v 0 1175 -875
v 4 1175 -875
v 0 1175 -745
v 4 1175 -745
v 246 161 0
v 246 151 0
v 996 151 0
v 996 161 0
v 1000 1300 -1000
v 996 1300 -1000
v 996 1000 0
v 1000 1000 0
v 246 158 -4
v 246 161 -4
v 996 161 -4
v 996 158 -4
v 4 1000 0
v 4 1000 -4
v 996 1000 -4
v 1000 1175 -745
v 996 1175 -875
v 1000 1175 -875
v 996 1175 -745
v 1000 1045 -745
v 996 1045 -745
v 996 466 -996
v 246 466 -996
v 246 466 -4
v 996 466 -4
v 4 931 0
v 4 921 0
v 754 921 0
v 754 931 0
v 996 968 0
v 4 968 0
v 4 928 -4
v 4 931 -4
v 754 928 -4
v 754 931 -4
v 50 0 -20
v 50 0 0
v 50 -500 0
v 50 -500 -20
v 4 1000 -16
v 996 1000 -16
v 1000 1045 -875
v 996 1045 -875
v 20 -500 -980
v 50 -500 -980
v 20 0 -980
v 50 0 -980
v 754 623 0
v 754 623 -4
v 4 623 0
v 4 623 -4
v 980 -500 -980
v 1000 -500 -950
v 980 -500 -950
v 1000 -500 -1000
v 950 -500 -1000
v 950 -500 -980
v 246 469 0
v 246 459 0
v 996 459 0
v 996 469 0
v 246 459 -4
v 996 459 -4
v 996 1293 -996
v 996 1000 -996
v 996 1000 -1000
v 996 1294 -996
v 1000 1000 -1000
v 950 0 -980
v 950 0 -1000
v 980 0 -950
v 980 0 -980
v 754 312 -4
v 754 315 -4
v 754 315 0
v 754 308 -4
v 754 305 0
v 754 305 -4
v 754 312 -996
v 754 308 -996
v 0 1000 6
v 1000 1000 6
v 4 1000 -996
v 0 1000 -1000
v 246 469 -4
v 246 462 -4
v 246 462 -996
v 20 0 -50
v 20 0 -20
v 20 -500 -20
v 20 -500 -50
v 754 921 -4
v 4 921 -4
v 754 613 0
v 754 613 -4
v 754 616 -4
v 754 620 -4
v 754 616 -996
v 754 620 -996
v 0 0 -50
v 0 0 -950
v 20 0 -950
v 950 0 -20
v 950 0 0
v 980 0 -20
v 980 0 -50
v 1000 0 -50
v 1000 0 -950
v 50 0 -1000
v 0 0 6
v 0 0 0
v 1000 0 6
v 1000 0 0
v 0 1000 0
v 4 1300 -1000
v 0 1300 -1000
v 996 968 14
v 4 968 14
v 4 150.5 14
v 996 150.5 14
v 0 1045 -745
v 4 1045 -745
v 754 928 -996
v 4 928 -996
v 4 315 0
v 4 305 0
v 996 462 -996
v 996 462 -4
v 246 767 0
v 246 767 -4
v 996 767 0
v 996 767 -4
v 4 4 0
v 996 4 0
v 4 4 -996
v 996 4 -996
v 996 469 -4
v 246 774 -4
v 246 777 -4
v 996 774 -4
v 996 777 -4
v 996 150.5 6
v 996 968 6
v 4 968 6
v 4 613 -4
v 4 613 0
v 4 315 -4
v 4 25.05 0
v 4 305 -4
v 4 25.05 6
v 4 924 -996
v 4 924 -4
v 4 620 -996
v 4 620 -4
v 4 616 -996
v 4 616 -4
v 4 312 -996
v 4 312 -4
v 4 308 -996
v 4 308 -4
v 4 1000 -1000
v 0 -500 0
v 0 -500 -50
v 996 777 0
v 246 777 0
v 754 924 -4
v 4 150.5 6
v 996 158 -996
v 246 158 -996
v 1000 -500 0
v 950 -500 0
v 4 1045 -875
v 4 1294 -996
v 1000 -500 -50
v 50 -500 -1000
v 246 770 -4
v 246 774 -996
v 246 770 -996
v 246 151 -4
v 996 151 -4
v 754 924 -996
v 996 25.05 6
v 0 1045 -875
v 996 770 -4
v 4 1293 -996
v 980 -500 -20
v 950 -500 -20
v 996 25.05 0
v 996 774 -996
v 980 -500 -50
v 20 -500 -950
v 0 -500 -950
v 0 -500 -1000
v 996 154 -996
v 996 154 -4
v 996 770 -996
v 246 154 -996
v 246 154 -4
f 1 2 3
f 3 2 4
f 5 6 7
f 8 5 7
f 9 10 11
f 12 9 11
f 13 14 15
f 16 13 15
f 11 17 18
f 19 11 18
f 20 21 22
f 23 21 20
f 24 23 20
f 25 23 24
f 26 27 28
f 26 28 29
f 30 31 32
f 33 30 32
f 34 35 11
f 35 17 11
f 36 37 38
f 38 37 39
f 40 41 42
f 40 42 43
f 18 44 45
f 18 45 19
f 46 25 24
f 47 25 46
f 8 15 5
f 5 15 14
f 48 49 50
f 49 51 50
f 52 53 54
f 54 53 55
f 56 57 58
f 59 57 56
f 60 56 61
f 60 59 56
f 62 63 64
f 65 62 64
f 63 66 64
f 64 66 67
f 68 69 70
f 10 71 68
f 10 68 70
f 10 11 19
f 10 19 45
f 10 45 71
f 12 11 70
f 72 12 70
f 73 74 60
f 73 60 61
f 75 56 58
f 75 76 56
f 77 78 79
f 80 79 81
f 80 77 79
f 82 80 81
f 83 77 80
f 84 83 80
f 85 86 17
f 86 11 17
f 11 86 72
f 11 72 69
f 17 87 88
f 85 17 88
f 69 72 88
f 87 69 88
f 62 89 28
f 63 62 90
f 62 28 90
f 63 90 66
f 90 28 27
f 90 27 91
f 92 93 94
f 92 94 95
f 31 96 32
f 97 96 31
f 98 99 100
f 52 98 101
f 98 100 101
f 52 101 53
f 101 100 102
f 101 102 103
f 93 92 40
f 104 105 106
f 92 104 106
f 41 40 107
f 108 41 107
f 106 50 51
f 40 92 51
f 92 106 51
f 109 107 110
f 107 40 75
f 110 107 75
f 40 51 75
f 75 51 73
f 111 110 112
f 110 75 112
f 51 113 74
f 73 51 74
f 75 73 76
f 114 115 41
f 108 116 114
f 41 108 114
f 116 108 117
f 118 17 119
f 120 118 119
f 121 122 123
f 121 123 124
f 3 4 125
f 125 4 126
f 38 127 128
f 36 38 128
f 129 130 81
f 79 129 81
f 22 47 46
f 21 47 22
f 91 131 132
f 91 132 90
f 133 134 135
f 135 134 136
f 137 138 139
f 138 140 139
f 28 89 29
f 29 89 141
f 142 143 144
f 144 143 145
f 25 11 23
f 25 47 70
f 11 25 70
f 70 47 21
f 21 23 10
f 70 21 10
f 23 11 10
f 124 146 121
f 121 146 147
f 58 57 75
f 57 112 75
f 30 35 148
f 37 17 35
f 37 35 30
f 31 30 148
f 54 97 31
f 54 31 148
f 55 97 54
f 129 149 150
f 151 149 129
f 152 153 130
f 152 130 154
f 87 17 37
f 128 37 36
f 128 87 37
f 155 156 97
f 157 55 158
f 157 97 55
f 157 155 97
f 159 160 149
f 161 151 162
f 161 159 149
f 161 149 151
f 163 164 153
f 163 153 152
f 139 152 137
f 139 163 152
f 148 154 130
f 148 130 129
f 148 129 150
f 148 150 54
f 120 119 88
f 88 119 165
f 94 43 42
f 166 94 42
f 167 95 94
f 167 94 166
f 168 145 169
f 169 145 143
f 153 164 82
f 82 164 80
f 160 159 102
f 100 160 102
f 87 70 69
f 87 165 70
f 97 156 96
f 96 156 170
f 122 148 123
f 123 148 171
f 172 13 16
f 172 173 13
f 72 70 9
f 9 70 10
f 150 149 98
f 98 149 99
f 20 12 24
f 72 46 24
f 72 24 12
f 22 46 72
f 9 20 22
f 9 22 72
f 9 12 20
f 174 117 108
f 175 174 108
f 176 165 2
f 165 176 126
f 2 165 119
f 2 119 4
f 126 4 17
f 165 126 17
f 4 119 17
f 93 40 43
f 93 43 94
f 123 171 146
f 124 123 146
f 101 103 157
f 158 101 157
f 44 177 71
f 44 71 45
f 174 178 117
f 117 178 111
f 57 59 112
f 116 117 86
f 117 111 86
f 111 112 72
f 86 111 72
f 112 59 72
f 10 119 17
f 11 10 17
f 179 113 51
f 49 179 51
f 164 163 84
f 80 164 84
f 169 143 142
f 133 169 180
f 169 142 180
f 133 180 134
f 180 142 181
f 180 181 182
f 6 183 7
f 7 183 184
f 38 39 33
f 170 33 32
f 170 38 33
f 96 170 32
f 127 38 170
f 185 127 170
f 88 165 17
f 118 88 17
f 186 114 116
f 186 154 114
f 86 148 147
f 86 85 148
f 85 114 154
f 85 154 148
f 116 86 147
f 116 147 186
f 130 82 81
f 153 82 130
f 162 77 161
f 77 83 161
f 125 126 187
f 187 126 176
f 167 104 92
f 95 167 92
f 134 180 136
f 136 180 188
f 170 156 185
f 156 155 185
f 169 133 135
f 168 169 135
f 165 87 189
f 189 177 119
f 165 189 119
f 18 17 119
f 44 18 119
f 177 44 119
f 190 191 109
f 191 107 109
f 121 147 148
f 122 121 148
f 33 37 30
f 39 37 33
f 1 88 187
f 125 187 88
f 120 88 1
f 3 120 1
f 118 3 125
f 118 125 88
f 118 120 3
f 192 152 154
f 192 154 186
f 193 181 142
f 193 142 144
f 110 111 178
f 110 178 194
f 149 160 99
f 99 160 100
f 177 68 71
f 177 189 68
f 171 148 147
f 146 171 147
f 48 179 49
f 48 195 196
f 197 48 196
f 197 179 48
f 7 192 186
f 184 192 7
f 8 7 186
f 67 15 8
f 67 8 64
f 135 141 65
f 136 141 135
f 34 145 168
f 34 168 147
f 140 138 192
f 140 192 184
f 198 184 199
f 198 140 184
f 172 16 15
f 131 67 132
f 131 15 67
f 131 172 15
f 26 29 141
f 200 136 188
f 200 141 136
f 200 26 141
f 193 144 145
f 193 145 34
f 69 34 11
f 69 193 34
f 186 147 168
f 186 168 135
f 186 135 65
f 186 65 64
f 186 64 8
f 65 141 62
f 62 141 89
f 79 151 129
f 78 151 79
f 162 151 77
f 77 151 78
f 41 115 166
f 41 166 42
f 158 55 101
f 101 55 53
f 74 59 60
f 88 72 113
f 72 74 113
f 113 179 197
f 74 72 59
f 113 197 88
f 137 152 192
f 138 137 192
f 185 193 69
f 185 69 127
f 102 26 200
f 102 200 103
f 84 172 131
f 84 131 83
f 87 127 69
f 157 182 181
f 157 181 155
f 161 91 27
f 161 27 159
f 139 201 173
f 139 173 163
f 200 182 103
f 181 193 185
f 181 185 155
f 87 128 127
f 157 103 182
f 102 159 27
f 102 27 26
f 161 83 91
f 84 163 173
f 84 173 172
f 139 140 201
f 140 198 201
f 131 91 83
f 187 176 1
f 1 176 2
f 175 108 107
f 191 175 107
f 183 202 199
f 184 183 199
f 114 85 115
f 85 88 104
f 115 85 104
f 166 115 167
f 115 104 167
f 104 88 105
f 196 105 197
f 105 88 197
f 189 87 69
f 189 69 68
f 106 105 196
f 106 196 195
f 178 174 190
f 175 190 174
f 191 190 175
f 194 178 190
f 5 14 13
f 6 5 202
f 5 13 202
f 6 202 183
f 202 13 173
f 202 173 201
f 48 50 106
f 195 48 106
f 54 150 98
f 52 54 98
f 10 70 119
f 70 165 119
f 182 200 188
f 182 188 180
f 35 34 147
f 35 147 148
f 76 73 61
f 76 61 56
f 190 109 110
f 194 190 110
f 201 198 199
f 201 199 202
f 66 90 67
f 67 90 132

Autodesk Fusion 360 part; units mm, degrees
sketch "Sketch1" plane through (0, 0, 0) normal (0, 1, 0) x (1, 0, 0)
  line L0 (1000, 0) -> (1000, 1000)
  line L1 (1000, 1000) -> (0, 1000)
  line L2 (0, 1000) -> (0, 0)
  line L3 (996, 4) -> (996, 996)
  line L4 (996, 996) -> (4, 996)
  line L5 (4, 996) -> (4, 4)
  line L6 (996, 4) -> (996, 0)
  line L7 (996, 0) -> (1000, 0)
  line L8 (4, 4) -> (4, 0)
  line L9 (4, 0) -> (0, 0)
  dimension "d1" = 1000
  dimension "d2" = 1000
  dimension "d3" = 992
  dimension "d4" = 992
extrude "Extrude1" add sketch "Sketch1" along normal blind 1000 makes body 1
ref_plane "WorkPlane1" through (500, 500, -996) normal (0, 0, 1) x (1, 0, 0)
sketch "Sketch2" plane through (0, 0, -996) normal (0, 0, 1) x (1, 0, 0)
  line L0 (4, 0) -> (996, 0)
  line L1 (996, 0) -> (996, 4)
  line L2 (996, 4) -> (4, 4)
  line L3 (4, 4) -> (4, 0)
  dimension "d8" = 992
  dimension "d9" = 4
extrude "Extrude2" add sketch "Sketch2" along normal blind 996 bodies 1
ref_plane "WorkPlane2" through (500, 502, -996) normal (0, 0, 1) x (1, 0, 0)
sketch "Sketch3" plane through (0, 0, -996) normal (0, 0, 1) x (1, 0, 0)
  line L0 (4, 312) -> (4, 308)
  line L1 (996, 154) -> (246, 154)
  line L2 (246, 154) -> (246, 158)
  line L3 (246, 158) -> (996, 158)
  line L4 (996, 158) -> (996, 154)
  line L5 (754, 308) -> (754, 312)
  line L6 (754, 312) -> (4, 312)
  line L7 (246, 466) -> (996, 466)
  line L8 (246, 462) -> (246, 466)
  line L9 (996, 462) -> (246, 462)
  line L10 (4, 312) -> (4, 308)
  line L11 (4, 308) -> (754, 308)
  line L12 (996, 466) -> (996, 462)
  line L13 (754, 620) -> (4, 620)
  line L14 (996, 774) -> (996, 770)
  line L15 (246, 774) -> (996, 774)
  line L16 (4, 620) -> (4, 616)
  line L17 (4, 620) -> (4, 616)
  line L18 (996, 770) -> (246, 770)
  line L19 (4, 616) -> (754, 616)
  line L20 (754, 616) -> (754, 620)
  line L21 (246, 770) -> (246, 774)
  line L22 (754, 928) -> (4, 928)
  line L23 (754, 924) -> (754, 928)
  line L24 (4, 924) -> (754, 924)
  line L25 (4, 928) -> (4, 924)
  line L26 (4, 928) -> (4, 924)
  dimension "d14" = 4
  dimension "d15" = 750
  dimension "d16" = 4
  dimension "d17" = 750
  dimension "d18" = 4
  dimension "d19" = 750
  dimension "d20" = 4
  dimension "d21" = 750
  dimension "d22" = 4
  dimension "d24" = 4
  dimension "d25" = 750
  dimension "d26" = 4
  dimension "d27" = 750
  dimension "d28" = 4
  dimension "d30" = 4
extrude "Extrude3" add sketch "Sketch3" along normal blind 992 separate body makes body 2 at (496, 466, -665.3333) makes body 3 at (746, 770, -665.3333) makes body 4 at (504, 312, -665.3333) makes body 5 at (254, 616, -665.3333) makes body 6 at (254, 924, -665.3333) makes body 7 at (746, 154, -665.3333)
ref_plane "WorkPlane3" through (4, 502, -498) normal (1, 0, 0) x (0, 0, -1)
sketch "Sketch4" plane through (4, 0, 0) normal (1, 0, 0) x (0, 0, -1)
  line L0 (1000, 1000) -> (1000, 1300)
  line L1 (1000, 1300) -> (0, 1000)
  line L2 (1000, 1000) -> (996, 1000)
  line L3 (0, 1000) -> (4, 1000)
  line L4 (996, 1000) -> (996, 1293)
  line L5 (996, 1293) -> (996, 1294)
  line L6 (996, 1294) -> (15.9999, 1000)
  line L7 (15.9999, 1000) -> (4, 1000)
  dimension "d34" = 300
  dimension "d35" = 4
  dimension "d36" = 4
extrude "Extrude4" add sketch "Sketch4" along normal blind 992 separate body makes body 8
ref_plane "WorkPlane4" through (379, 926, -4) normal (0, 0, 1) x (1, 0, 0)
sketch "Sketch5" plane through (0, 0, -4) normal (0, 0, 1) x (1, 0, 0)
  line L0 (4, 305) -> (4, 315)
  line L1 (996, 161) -> (246, 161)
  line L2 (246, 161) -> (246, 151)
  line L3 (246, 151) -> (996, 151)
  line L4 (996, 151) -> (996, 161)
  line L5 (996, 767) -> (996, 777)
  line L6 (246, 767) -> (996, 767)
  line L7 (996, 777) -> (246, 777)
  line L8 (246, 777) -> (246, 767)
  line L9 (4, 931) -> (754, 931)
  line L10 (754, 921) -> (4, 921)
  line L11 (4, 921) -> (4, 931)
  line L12 (754, 931) -> (754, 921)
  line L13 (996, 469) -> (246, 469)
  line L14 (996, 459) -> (996, 469)
  line L15 (754, 315) -> (754, 305)
  line L16 (754, 305) -> (4, 305)
  line L17 (4, 315) -> (754, 315)
  line L18 (246, 459) -> (996, 459)
  line L19 (246, 469) -> (246, 459)
  line L20 (4, 305) -> (4, 315)
  line L21 (4, 613) -> (754, 613)
  line L22 (754, 613) -> (754, 623)
  line L23 (754, 623) -> (4, 623)
  line L24 (4, 623) -> (4, 613)
  dimension "d41" = 10
  dimension "d42" = 750
  dimension "d43" = 10
  dimension "d44" = 750
  dimension "d45" = 10
  dimension "d46" = 750
  dimension "d47" = 10
  dimension "d48" = 750
  dimension "d49" = 10
  dimension "d50" = 750
  dimension "d51" = 10
  dimension "d52" = 750
  dimension "d53" = 10
extrude "Extrude5" add sketch "Sketch5" along normal blind 4 bodies 1 2 3 4 5 6 7
ref_plane "WorkPlane5" through (996, 1150, -500) normal (1, 0, 0) x (0, 0, -1)
sketch "Sketch6" plane through (996, 0, 0) normal (1, 0, 0) x (0, 0, -1)
  line L0 (875, 1175) -> (745, 1175)
  line L1 (745, 1175) -> (745, 1045)
  line L2 (745, 1045) -> (875, 1045)
  line L3 (875, 1045) -> (875, 1175)
  line L4 (1000, 1000) -> (1000, 1300)
  line L5 (1000, 1300) -> (0, 1000)
  line L6 (0, 1000) -> (1000, 1000)
  dimension "d57" = 130
  dimension "d58" = 130
extrude "Extrude6" add sketch "Sketch6" along normal blind 4 separate body makes body 9
sketch "Sketch7" plane through (4, 0, 0) normal (-1, 0, 0) x (0, 0, 1)
  line L0 (-1000, 1300) -> (-1000, 1000)
  line L1 (-1000, 1000) -> (-996, 1000)
  line L2 (-996, 1000) -> (-996, 1294)
  line L3 (-996, 1294) -> (-15.9999, 1000)
  line L4 (-15.9999, 1000) -> (0, 1000)
  line L5 (0, 1000) -> (-1000, 1300)
  line L6 (-1000, 1300) -> (-1000, 1000)
  line L7 (-1000, 1300) -> (0, 1000)
  line L8 (0, 1000) -> (-1000, 1000)
  line L9 (-875, 1175) -> (-745, 1175)
  line L10 (-745, 1175) -> (-745, 1045)
  line L11 (-745, 1045) -> (-875, 1045)
  line L12 (-875, 1045) -> (-875, 1175)
extrude "Extrude7" add sketch "Sketch7" along normal blind 4 separate body makes body 10
ref_plane "WorkPlane6" through (500, 500, 0) normal (0, 0, 1) x (1, 0, 0)
sketch "Sketch8" plane through (0, 0, 0) normal (0, 0, 1) x (1, 0, 0)
  line L0 (0, 0) -> (1000, 0)
  line L1 (1000, 0) -> (1000, 1000)
  line L2 (1000, 1000) -> (0, 1000)
  line L3 (0, 1000) -> (0, 0)
  line L4 (4, 25.0504) -> (996, 25.0504)
  line L5 (996, 25.0504) -> (996, 968)
  line L6 (996, 968) -> (4, 968)
  line L7 (4, 968) -> (4, 25.0504)
extrude "Extrude8" add sketch "Sketch8" along normal blind 6 separate body makes body 11
ref_plane "WorkPlane7" through (500, 500, 6) normal (0, 0, 1) x (1, 0, 0)
sketch "Sketch9" plane through (0, 0, 6) normal (0, 0, 1) x (1, 0, 0)
  line L0 (4, 150.5002) -> (996, 150.5002)
  line L1 (996, 150.5002) -> (996, 968)
  line L2 (996, 968) -> (4, 968)
  line L3 (4, 968) -> (4, 150.5002)
extrude "Extrude9" add sketch "Sketch9" along normal blind 8 separate body makes body 12
ref_plane "WorkPlane8" through (500, 0, -500) normal (0, -1, 0) x (-1, 0, 0)
sketch "Sketch10" plane through (0, 0, 0) normal (0, -1, 0) x (-1, 0, 0)
  line L0 (0, 0) -> (0, 50)
  line L1 (0, 50) -> (-20, 50)
  line L2 (0, 0) -> (-50, 0)
  line L3 (-50, 0) -> (-50, 20)
  line L4 (-50, 20) -> (-20, 20)
  line L5 (-20, 20) -> (-20, 35)
  line L6 (-1000, 0) -> (-950, 0)
  line L7 (-950, 0) -> (-950, 20)
  line L8 (-1000, 0) -> (-1000, 50)
  line L9 (-1000, 50) -> (-980, 50)
  line L10 (-950, 20) -> (-980, 20)
  line L11 (-980, 20) -> (-980, 50)
  line L12 (-1000, 1000) -> (-1000, 950)
  line L13 (-1000, 950) -> (-980, 950)
  line L14 (-1000, 1000) -> (-950, 1000)
  line L15 (-950, 1000) -> (-950, 980)
  line L16 (-950, 980) -> (-980, 980)
  line L17 (-980, 980) -> (-980, 950)
  line L18 (0, 1000) -> (0, 950)
  line L19 (0, 950) -> (-20, 950)
  line L20 (0, 1000) -> (-50, 1000)
  line L21 (-50, 1000) -> (-50, 980)
  line L22 (-50, 980) -> (-20, 980)
  line L23 (-20, 980) -> (-20, 950)
  line L24 (-20, 35) -> (-20, 50)
  dimension "d70" = 50
  dimension "d71" = 20
  dimension "d72" = 50
  dimension "d73" = 20
  dimension "d74" = 50
  dimension "d75" = 20
  dimension "d76" = 50
  dimension "d77" = 20
  dimension "d78" = 50
  dimension "d79" = 50
  dimension "d80" = 20
extrude "Extrude10" add sketch "Sketch10" along normal blind 500 bodies 1 12 11
